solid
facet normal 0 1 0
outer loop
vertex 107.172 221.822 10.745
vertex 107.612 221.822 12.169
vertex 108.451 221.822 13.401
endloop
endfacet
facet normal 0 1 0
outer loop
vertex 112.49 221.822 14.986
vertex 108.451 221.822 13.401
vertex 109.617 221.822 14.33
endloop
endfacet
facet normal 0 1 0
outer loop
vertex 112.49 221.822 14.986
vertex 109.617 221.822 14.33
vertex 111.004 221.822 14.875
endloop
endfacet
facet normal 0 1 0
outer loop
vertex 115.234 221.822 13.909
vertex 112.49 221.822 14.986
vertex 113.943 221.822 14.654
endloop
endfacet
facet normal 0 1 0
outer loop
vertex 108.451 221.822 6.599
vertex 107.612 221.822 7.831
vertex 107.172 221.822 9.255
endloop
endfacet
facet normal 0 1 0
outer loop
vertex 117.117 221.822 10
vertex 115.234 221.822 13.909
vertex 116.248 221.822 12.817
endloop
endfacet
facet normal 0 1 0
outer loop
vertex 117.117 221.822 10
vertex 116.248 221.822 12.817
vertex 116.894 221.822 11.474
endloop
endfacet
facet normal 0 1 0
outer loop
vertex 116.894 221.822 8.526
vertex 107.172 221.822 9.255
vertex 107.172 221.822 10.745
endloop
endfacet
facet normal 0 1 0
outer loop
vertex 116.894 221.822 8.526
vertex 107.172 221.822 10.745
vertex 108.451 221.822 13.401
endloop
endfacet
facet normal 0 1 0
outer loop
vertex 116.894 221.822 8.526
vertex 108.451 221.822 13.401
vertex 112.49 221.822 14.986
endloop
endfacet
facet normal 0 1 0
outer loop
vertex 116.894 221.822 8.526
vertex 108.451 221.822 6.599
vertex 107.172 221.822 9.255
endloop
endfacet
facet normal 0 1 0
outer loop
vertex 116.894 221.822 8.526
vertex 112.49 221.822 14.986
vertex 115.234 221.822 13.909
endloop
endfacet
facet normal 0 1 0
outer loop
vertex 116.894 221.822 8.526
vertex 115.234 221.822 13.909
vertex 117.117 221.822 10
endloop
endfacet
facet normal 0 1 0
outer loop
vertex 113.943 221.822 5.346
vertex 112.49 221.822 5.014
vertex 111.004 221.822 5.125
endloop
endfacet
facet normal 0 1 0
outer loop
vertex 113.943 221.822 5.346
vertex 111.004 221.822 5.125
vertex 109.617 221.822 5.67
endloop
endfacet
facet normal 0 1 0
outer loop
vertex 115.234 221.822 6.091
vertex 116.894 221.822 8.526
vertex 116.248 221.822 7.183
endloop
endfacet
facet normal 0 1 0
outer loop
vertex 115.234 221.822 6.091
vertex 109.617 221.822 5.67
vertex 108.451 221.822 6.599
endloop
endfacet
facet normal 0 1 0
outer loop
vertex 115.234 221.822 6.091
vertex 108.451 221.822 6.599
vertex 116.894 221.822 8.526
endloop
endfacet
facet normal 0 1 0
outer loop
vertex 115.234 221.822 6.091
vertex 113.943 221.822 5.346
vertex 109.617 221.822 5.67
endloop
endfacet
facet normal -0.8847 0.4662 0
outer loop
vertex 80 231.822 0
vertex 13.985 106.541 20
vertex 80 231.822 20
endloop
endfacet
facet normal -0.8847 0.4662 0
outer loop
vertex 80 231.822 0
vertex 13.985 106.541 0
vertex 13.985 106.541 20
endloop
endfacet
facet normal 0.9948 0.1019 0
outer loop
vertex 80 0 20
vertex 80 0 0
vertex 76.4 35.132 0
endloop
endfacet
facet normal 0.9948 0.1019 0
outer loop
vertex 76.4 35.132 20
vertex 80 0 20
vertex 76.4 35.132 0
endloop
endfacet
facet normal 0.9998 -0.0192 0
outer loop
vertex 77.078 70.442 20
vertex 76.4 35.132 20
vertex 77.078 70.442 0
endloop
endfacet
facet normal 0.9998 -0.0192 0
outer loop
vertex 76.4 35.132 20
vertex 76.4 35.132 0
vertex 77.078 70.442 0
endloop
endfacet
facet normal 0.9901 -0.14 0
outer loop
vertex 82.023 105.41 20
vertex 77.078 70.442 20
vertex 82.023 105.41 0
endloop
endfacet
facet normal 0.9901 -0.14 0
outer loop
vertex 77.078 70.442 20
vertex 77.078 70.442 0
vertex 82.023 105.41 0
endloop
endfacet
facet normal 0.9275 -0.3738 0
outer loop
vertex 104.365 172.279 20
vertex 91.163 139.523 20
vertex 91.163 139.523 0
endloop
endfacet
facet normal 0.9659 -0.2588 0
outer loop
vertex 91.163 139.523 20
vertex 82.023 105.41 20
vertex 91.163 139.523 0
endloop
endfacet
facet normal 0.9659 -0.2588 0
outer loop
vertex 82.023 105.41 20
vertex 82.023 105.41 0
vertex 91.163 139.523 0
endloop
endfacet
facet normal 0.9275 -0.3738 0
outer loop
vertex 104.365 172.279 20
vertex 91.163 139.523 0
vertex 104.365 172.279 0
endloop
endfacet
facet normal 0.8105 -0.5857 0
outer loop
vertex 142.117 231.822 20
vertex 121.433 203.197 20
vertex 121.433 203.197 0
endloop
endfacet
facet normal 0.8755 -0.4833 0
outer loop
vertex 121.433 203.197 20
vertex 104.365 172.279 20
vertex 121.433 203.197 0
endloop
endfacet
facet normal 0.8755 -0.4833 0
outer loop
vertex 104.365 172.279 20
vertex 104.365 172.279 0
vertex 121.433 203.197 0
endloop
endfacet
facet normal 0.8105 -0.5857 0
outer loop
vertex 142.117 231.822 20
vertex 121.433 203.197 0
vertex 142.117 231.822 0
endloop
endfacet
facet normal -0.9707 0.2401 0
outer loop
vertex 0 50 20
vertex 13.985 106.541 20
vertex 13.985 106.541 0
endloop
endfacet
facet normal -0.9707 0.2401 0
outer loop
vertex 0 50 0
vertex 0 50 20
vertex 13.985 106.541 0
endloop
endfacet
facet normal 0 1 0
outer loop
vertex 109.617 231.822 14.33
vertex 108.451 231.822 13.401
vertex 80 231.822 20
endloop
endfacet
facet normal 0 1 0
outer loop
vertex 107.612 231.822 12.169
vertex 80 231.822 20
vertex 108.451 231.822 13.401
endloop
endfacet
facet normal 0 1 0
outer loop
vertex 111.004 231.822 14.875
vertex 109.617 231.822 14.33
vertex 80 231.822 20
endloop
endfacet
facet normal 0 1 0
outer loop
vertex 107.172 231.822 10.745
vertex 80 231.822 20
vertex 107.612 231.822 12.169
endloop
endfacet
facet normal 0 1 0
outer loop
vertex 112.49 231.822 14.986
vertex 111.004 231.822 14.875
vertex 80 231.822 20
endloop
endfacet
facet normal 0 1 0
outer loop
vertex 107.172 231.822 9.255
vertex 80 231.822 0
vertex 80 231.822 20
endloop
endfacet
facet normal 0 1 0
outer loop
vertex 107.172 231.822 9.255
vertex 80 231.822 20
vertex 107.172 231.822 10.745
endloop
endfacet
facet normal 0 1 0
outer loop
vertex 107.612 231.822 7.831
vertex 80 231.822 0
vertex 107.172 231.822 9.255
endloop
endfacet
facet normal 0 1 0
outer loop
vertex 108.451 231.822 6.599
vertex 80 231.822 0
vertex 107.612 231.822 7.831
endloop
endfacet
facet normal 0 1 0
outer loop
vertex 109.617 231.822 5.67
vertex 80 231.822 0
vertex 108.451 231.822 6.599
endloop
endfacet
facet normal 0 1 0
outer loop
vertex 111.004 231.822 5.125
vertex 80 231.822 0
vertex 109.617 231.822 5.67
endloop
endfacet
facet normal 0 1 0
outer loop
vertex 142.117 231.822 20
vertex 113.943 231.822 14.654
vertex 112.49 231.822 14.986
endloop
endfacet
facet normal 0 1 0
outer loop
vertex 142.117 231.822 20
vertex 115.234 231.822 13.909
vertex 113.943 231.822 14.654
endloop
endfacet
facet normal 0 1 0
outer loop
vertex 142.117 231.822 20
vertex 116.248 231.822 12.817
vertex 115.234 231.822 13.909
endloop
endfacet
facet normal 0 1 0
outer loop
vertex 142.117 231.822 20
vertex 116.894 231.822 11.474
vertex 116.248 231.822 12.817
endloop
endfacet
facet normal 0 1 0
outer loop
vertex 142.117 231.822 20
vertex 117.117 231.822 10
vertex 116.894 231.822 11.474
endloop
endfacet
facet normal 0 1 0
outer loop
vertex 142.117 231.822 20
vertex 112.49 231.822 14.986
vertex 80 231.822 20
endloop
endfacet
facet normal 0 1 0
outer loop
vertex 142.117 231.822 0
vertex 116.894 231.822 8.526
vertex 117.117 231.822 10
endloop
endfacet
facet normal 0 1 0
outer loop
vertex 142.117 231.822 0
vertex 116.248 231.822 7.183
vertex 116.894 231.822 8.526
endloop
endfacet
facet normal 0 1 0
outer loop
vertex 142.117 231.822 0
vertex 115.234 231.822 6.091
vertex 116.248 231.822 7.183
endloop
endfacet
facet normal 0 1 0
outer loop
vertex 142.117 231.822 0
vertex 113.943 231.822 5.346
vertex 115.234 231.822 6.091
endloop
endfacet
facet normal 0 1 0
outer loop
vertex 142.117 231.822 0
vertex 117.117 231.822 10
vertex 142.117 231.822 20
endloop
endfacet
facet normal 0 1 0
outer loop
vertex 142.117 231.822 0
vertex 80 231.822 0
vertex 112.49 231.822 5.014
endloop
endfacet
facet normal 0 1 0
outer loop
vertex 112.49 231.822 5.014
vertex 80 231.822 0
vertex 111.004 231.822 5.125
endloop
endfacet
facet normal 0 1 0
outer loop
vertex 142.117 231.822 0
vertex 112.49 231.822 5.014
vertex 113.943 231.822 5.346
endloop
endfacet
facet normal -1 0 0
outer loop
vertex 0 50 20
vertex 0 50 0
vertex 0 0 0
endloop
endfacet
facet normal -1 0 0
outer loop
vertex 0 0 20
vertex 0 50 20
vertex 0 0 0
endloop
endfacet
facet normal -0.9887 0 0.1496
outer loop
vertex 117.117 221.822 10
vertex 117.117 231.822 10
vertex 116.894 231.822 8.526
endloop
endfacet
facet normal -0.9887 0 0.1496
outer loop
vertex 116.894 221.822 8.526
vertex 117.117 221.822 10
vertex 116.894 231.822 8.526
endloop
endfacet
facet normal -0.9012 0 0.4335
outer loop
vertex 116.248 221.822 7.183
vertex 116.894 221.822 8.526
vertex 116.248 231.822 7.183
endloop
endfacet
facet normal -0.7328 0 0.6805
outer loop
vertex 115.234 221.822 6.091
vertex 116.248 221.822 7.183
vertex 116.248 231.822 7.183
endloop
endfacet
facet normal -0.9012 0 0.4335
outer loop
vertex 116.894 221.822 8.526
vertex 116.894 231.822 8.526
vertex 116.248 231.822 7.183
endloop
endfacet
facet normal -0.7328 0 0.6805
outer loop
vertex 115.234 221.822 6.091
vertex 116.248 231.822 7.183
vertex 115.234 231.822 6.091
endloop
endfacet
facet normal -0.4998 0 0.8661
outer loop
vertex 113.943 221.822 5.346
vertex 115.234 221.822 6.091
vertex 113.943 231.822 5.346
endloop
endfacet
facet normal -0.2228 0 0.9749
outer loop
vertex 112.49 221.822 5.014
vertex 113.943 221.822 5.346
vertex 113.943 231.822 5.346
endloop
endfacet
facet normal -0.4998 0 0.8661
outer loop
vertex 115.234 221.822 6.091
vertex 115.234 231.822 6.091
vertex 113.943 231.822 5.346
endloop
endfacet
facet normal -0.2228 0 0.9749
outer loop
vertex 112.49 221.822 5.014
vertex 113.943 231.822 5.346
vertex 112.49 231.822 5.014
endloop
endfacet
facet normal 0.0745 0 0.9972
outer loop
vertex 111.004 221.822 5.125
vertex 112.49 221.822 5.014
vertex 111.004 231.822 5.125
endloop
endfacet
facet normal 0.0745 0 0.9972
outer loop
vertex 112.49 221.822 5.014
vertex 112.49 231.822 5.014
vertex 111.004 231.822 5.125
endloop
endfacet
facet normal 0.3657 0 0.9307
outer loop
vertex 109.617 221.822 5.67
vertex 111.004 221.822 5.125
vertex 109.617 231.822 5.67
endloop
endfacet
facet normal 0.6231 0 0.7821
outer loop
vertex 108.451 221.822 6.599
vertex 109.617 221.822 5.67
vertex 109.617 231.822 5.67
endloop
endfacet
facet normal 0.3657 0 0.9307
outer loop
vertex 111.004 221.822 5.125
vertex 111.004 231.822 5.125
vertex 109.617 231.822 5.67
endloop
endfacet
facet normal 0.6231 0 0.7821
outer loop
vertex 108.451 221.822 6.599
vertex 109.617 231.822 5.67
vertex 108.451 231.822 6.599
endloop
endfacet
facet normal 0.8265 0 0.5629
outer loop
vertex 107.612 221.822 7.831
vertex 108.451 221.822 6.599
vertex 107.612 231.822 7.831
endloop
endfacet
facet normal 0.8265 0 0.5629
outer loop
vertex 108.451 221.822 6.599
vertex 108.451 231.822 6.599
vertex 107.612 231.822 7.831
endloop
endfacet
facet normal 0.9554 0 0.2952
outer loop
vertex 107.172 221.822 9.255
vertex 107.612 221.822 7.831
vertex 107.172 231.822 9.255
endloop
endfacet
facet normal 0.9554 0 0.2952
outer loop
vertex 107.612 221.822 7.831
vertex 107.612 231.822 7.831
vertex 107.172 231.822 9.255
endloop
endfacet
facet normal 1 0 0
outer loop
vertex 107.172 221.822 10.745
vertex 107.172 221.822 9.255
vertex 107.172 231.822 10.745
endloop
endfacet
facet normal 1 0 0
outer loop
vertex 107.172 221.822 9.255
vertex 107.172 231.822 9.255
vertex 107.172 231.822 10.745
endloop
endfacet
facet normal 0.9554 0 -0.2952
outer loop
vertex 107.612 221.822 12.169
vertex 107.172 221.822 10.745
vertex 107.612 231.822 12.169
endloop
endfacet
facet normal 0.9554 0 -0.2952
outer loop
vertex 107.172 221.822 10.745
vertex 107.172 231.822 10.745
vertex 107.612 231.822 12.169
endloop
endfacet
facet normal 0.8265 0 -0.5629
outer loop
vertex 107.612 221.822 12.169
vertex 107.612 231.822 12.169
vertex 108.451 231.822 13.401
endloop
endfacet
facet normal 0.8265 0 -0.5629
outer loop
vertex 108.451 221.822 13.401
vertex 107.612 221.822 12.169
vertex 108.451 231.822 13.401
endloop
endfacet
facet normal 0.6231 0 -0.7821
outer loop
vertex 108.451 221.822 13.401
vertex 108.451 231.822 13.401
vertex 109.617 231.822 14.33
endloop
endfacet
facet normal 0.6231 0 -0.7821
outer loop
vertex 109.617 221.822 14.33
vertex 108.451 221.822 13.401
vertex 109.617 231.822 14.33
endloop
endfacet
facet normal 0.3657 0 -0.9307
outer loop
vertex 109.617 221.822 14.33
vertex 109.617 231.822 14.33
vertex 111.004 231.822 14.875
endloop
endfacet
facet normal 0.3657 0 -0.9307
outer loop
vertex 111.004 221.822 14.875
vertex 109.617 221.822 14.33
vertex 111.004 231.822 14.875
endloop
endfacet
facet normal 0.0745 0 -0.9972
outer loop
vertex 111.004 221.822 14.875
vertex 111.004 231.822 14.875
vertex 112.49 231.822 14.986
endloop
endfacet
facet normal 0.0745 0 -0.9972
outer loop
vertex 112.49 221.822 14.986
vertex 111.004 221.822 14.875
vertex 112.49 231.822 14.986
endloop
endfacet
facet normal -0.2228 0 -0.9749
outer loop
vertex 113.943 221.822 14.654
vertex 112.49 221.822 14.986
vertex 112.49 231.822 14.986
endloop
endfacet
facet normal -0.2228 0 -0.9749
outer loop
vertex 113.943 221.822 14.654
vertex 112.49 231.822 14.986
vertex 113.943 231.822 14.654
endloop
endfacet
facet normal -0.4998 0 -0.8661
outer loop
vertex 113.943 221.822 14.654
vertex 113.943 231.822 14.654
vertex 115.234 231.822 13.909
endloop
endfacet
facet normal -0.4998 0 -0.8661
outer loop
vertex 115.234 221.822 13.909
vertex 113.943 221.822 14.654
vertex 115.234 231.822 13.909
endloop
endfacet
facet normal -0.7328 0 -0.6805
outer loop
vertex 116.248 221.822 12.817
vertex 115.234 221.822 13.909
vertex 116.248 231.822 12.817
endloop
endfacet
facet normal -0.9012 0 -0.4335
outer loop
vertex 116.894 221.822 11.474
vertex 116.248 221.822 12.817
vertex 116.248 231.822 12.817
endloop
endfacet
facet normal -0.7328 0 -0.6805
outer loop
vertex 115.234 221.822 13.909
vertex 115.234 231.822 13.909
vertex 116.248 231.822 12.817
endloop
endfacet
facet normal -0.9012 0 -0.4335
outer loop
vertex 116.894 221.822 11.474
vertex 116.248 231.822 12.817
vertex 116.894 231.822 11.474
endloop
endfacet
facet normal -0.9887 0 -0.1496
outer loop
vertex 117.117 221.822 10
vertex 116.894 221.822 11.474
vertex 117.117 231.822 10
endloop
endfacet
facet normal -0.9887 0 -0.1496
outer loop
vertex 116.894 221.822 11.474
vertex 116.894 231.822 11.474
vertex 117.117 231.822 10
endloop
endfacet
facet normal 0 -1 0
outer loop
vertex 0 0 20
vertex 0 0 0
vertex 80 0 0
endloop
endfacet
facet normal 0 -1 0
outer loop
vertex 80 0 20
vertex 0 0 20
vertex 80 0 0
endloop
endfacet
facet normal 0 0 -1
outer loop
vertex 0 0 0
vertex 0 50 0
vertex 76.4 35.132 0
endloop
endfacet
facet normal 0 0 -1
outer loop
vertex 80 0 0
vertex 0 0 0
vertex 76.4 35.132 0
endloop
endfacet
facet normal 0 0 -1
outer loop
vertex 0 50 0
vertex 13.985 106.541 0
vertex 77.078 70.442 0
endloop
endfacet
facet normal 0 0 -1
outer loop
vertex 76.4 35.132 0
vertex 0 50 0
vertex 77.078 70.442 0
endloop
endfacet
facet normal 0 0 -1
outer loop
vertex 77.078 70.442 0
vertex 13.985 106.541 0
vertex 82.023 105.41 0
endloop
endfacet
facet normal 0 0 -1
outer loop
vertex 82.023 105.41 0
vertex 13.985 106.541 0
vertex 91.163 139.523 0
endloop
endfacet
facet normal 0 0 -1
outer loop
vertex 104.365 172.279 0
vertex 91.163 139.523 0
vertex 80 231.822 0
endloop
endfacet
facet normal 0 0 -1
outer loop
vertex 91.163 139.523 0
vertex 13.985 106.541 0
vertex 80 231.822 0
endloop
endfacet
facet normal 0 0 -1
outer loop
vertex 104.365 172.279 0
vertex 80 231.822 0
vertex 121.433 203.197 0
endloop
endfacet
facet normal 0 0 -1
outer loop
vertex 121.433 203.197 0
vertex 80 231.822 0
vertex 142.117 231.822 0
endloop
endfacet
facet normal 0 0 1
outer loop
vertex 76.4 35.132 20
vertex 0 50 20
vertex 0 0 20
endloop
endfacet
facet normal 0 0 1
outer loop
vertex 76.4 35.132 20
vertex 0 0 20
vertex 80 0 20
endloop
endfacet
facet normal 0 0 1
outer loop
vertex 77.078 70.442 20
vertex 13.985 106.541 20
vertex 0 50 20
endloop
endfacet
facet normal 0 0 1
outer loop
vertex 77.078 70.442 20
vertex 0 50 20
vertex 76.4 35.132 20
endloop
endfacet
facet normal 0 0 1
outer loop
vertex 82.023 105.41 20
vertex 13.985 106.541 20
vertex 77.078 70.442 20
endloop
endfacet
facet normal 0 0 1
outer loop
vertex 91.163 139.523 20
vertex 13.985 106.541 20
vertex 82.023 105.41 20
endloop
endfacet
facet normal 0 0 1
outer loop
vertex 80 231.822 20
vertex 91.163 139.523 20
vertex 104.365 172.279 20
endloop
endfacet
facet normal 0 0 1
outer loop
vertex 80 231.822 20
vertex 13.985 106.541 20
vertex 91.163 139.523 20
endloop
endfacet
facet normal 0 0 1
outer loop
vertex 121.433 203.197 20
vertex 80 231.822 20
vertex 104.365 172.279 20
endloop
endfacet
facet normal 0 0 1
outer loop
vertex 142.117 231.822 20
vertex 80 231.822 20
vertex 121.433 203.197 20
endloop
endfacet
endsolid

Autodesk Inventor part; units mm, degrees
ref_plane "YZ Plane" through (0, 0, 0) normal (1, 0, 0) x (0, 1, 0)
ref_plane "XZ Plane" through (0, 0, 0) normal (0, 1, 0) x (-1, 0, 0)
ref_plane "XY Plane" through (0, 0, 0) normal (0, 0, 1) x (1, 0, 0)
sketch "Sketch1" plane through (0, 0, 0) normal (0, 0, 1) x (1, 0, 0)
  line L0 (0, 0) -> (80, 0)
  line L1 (0, 80) -> (0, 0)
  line L2 (40, 0) -> (160, 0) construction
  line L3 (0, 80) -> (80, 231.8222)
  line L4 (80, 231.8222) -> (142.1166, 231.8222)
  arc A0 (142.1166, 231.8222) -> (80, 0) centre (367.4632, 47.2076) ccw
  dimension "d2" = 240
  dimension "d4" = 80
extrude "Extrusion1" add sketch "Sketch1" along normal blind 20
chamfer "Chamfer1" distance 30 angle 45 1 edges at (0, 80, 10)
sketch "Sketch2" plane through (80, 231.8222, 0) normal (0, 1, 0) x (1, 0, 0)
  line L0 (62.1166, 0) -> (62.1166, -20) projected
  line L1 (62.1166, -10) -> (32.1166, -10)
  circle A0 centre (32.1166, -10) radius 5
  point P0 (-80, 0)
  dimension "d10" = 30
  dimension "d11" = 10
extrude "Extrusion2" cut sketch "Sketch2" against normal blind 10
properties part number "Base_Aerofoil"
